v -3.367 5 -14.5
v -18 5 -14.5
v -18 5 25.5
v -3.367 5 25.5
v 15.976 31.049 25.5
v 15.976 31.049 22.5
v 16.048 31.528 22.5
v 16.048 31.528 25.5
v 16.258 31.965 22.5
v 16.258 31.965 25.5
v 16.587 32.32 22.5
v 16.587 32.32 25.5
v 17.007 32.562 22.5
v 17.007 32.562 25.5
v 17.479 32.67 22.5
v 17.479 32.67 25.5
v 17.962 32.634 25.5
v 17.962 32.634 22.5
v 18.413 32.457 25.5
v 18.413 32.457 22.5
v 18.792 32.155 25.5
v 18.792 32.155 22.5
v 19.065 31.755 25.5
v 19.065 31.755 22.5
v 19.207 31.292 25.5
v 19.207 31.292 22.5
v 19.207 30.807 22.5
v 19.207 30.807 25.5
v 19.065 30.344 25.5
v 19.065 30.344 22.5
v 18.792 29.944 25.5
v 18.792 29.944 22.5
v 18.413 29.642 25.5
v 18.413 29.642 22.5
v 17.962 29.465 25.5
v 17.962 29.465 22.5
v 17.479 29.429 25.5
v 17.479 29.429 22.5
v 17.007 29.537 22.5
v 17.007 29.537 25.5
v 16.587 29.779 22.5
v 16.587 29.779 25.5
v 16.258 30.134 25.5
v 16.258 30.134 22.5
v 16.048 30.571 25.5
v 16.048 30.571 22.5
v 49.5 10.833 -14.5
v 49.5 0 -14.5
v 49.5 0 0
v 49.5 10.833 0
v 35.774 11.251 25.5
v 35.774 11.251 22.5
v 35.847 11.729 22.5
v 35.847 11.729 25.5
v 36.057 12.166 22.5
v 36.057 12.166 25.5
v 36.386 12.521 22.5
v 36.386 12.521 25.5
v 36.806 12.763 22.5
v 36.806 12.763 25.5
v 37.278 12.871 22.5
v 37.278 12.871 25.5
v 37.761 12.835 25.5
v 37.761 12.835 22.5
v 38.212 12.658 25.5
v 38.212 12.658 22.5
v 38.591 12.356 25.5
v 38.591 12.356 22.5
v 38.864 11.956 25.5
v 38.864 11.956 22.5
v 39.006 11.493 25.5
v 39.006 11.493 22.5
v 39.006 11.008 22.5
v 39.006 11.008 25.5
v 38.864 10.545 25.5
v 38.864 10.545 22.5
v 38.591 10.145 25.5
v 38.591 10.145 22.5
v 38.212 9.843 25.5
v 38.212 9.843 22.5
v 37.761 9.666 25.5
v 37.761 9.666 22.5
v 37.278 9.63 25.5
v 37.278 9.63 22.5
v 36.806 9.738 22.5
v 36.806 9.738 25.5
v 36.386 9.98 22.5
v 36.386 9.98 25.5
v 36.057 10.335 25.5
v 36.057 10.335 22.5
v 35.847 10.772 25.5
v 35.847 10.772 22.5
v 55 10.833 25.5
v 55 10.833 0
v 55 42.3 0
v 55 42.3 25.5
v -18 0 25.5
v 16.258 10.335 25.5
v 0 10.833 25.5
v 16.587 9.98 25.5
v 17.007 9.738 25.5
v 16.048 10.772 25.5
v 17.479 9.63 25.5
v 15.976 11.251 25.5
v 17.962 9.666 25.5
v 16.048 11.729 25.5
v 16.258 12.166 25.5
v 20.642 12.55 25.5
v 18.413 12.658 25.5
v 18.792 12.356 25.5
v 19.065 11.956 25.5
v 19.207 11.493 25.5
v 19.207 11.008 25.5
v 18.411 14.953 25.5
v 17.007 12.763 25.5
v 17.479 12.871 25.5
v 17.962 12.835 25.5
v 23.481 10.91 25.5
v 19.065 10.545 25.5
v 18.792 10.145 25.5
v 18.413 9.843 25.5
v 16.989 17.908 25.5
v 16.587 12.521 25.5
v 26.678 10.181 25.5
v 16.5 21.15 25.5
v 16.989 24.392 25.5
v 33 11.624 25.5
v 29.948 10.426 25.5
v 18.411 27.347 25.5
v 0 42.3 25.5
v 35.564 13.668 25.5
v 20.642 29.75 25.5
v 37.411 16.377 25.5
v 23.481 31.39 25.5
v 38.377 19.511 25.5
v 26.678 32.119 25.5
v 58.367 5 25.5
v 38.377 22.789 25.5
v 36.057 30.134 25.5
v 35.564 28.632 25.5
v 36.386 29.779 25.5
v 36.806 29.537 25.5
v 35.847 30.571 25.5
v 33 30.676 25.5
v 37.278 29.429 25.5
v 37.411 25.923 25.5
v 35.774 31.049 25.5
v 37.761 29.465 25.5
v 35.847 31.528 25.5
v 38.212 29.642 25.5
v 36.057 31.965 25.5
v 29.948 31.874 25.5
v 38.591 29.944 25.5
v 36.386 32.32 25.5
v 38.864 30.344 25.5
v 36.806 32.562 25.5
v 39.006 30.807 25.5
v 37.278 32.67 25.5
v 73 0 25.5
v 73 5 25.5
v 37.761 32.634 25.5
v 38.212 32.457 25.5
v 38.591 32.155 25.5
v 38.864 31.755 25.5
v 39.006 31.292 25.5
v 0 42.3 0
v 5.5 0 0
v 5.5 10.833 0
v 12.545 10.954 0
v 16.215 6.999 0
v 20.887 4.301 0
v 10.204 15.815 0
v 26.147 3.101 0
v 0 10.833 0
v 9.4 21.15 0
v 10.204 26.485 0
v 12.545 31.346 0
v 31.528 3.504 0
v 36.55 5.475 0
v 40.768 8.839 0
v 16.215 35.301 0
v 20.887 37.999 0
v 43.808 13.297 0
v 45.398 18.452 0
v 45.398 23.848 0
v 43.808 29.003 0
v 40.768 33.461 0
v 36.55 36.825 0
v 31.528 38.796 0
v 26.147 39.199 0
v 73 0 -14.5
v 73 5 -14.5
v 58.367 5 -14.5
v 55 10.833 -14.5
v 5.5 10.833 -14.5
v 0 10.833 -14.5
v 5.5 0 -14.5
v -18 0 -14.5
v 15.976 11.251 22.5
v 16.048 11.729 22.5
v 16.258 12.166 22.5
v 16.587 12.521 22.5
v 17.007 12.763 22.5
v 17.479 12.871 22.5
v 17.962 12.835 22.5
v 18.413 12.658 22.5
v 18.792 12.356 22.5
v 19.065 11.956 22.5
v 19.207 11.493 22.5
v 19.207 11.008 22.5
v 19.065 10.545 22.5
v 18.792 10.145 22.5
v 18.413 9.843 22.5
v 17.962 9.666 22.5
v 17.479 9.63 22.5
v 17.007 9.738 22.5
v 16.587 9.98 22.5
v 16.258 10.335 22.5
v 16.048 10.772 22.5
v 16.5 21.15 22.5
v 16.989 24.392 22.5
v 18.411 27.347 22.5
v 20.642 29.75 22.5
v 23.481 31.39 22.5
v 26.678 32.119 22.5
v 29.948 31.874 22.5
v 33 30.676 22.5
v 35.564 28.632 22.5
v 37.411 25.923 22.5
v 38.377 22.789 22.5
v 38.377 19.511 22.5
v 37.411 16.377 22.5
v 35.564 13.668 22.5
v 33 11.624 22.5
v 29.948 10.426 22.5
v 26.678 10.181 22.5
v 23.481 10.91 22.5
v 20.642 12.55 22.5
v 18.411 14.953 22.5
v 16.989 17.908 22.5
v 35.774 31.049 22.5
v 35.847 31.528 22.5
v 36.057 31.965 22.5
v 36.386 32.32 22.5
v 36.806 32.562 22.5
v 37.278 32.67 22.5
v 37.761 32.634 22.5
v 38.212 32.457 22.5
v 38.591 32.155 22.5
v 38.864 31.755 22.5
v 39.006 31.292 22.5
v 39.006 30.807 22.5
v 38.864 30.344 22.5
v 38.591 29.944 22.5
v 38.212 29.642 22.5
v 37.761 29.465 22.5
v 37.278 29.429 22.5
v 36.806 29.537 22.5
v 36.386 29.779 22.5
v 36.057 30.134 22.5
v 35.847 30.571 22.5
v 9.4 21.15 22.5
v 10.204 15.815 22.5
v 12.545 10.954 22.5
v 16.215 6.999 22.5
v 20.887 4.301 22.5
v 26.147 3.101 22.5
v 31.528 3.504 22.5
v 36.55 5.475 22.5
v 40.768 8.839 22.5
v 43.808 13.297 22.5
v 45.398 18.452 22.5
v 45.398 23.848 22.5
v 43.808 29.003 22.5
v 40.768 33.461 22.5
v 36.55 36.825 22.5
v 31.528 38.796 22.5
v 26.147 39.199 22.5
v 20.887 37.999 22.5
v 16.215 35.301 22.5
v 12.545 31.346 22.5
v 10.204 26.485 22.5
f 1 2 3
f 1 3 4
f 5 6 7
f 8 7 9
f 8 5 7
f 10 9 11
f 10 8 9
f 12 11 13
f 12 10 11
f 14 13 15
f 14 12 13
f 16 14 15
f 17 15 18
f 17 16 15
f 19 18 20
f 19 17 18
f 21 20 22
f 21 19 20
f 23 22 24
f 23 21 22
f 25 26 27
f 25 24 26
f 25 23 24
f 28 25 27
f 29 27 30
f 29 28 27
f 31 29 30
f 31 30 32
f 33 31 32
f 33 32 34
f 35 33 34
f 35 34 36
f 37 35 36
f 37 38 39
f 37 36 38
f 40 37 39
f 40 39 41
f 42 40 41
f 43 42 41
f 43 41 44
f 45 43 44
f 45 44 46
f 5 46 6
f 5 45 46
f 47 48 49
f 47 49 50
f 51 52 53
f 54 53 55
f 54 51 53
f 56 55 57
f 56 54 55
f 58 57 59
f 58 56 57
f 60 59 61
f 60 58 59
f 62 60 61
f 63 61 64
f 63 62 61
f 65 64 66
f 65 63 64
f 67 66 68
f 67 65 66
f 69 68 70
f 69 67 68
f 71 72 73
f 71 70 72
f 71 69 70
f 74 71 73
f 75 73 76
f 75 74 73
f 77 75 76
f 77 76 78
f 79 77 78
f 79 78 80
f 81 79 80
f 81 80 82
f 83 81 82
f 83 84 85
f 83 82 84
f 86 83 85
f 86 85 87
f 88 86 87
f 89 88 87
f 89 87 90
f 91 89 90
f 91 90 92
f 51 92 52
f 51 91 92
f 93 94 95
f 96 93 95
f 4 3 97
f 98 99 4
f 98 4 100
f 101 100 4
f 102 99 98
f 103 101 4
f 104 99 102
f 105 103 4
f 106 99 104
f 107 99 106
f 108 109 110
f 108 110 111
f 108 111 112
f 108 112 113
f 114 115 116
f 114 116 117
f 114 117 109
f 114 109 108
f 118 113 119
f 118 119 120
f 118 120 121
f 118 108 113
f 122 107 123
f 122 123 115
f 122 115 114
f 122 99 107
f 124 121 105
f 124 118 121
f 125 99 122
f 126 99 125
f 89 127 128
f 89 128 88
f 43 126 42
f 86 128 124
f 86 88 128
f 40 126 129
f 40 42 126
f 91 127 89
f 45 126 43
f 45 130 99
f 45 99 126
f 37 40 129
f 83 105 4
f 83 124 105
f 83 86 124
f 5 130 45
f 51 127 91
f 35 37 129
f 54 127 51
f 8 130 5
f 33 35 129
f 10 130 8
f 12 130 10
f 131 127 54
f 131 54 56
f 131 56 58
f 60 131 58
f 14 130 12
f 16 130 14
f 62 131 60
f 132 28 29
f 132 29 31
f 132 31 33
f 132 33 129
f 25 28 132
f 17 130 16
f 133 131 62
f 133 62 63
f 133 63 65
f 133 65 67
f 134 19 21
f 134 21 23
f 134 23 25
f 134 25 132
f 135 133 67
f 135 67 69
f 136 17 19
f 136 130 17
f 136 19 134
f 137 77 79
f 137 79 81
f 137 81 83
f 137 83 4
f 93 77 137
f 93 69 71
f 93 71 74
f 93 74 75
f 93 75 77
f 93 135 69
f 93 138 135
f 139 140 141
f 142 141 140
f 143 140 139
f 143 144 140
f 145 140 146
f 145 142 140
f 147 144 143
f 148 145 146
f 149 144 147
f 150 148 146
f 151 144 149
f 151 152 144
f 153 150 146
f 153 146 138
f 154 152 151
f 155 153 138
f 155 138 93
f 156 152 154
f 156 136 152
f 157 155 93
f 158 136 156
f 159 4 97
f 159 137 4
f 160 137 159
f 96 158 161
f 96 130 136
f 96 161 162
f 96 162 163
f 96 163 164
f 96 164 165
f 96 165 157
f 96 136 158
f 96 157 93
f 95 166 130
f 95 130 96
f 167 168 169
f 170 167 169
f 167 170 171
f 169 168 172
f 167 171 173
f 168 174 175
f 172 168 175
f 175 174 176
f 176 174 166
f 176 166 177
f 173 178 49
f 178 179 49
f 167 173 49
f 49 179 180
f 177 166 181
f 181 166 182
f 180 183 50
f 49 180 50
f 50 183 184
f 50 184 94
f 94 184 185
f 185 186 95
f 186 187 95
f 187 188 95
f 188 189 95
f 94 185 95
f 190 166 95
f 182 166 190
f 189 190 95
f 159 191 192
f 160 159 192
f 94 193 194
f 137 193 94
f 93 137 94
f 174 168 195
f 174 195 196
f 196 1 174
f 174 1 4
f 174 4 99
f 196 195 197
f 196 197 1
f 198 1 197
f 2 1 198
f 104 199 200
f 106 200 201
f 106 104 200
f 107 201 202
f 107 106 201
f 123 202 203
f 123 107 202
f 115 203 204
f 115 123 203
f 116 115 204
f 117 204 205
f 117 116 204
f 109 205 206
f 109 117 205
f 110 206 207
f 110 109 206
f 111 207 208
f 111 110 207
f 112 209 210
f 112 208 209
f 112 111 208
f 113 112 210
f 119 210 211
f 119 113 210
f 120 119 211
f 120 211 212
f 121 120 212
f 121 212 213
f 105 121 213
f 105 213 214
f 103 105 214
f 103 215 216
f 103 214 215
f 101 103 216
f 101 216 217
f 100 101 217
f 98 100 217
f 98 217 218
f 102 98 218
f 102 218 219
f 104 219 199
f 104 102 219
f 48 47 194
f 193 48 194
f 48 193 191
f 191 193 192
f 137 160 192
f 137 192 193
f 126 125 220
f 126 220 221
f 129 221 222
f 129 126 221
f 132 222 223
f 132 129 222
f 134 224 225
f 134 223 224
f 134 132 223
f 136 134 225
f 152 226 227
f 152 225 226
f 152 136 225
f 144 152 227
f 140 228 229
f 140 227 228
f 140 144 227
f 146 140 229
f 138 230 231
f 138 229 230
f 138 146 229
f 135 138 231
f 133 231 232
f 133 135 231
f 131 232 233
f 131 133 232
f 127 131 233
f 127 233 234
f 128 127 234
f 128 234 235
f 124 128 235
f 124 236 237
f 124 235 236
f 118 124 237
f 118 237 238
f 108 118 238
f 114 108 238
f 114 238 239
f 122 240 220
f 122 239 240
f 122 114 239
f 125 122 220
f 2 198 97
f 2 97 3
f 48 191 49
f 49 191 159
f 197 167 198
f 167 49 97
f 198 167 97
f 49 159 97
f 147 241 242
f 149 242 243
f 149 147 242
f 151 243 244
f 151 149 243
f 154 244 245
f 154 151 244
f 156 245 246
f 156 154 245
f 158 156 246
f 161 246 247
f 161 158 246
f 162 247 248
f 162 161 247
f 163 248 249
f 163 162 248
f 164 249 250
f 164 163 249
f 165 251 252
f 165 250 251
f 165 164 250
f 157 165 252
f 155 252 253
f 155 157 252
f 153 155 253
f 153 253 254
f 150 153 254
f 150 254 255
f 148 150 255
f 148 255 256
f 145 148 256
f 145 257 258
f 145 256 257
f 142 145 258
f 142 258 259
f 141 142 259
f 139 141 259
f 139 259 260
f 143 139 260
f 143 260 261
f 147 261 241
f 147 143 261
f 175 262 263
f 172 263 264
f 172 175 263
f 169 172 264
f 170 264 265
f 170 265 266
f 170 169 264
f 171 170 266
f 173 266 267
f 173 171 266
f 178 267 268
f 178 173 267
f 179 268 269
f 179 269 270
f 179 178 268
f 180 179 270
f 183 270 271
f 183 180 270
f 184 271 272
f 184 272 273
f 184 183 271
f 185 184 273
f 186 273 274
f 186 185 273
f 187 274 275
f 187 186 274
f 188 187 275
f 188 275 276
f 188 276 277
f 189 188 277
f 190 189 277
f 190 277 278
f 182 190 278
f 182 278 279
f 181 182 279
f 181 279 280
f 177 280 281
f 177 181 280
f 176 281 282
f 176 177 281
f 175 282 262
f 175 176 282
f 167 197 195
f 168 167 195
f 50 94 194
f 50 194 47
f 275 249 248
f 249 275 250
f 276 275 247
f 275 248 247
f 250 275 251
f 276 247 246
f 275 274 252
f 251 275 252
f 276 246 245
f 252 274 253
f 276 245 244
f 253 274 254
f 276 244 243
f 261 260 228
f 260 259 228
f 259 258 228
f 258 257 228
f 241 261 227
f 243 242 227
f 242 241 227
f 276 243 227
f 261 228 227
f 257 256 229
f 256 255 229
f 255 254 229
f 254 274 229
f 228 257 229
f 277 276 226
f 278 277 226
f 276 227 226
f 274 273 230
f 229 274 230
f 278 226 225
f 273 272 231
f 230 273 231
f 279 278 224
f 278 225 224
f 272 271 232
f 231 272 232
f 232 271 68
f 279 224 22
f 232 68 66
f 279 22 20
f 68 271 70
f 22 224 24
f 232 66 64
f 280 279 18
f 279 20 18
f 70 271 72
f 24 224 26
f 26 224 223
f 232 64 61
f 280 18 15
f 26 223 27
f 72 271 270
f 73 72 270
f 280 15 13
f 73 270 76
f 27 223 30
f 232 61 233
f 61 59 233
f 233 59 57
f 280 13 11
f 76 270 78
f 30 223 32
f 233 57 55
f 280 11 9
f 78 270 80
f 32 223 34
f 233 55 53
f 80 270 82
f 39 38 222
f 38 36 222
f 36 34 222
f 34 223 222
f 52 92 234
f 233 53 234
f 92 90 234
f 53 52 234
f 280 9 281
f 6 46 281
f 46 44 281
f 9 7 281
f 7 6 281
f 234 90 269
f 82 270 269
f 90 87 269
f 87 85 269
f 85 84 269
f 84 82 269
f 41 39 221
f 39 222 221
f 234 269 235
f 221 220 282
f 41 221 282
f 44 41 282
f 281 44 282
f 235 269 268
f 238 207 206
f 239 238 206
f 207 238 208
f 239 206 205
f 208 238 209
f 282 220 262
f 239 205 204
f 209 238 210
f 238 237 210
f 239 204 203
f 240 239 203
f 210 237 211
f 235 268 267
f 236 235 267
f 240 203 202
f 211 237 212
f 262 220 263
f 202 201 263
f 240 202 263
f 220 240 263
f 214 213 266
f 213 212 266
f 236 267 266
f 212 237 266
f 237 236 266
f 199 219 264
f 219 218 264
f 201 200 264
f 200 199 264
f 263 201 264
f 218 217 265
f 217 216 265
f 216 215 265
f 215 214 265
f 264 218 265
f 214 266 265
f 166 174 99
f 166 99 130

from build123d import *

# Parameters (mm, degrees)
ESQUISSE1_W                  = 55
ESQUISSE1_H                  = 42.3
BOSS_EXTRU_1_DEPTH           = 25.5
ESQUISSE4_R                  = 18.1
ENL_V_MAT_EXTRU_3_DEPTH      = 22.5
ENL_V_MAT_EXTRU_4_DEPTH      = 62.713369702
ENL_V_MAT_EXTRU_4_DEPTH_BACK = 62.713369702
ESQUISSE5_R                  = 11
ESQUISSE6_R                  = 1.625
ENL_V_MAT_EXTRU_5_DEPTH      = 10
BOSS_EXTRU_2_DEPTH           = 40
ESQUISSE16_W                 = 5.5
ESQUISSE16_H                 = 10.832527472
BOSS_EXTRU_4_DEPTH           = 14.5


with BuildPart() as part:
    # Esquisse1 → Boss.-Extru.1 (new body)
    with BuildSketch(Plane.XY):
        with Locations((27.5, 21.15)):
            Rectangle(ESQUISSE1_W, ESQUISSE1_H)
    extrude(amount=BOSS_EXTRU_1_DEPTH)

    # Esquisse4 → Enlèv. mat.-Extru.3 (cut)
    with BuildSketch(Plane.XY):
        with Locations(Location((27.5, 21.15, 0), (0, 0, 180))):
            Circle(ESQUISSE4_R)
    extrude(amount=ENL_V_MAT_EXTRU_3_DEPTH, mode=Mode.SUBTRACT)

    # Esquisse5 → Enlèv. mat.-Extru.4 (cut, two sides: drawn at the far end of the back side and taken through both)
    with BuildSketch(Plane(origin=(37, 0, 25.5), x_dir=(-1, 0, 0), z_dir=(0, 0, -1)).offset(-ENL_V_MAT_EXTRU_4_DEPTH_BACK)):
        with Locations((9.5, 21.15)):
            Circle(ESQUISSE5_R)
    extrude(amount=ENL_V_MAT_EXTRU_4_DEPTH + ENL_V_MAT_EXTRU_4_DEPTH_BACK, mode=Mode.SUBTRACT)

    # Esquisse6 → Enlèv. mat.-Extru.5 (cut)
    with BuildSketch(Plane(origin=(0, 0, 25.5), x_dir=(-1, 0, 0), z_dir=(0, 0, -1))):
        with Locations((-37.399494937, 31.049494937)):
            Circle(ESQUISSE6_R)
        with Locations((-17.600505063, 31.049494937)):
            Circle(ESQUISSE6_R)
        with Locations((-17.600505063, 11.250505063)):
            Circle(ESQUISSE6_R)
        with Locations((-37.399494937, 11.250505063)):
            Circle(ESQUISSE6_R)
    extrude(amount=ENL_V_MAT_EXTRU_5_DEPTH, mode=Mode.SUBTRACT)

    # Esquisse7 → Boss.-Extru.2 (add)
    with BuildSketch(Plane.XY.offset(25.5)):
        Polygon((55, 0), (73, 0), (73, 5), (58.367411306, 5), (55, 10.832527472), align=None)
        Polygon((-18, 0), (-18, 5), (-3.367411306, 5), (0, 10.832527472), (0, 0), align=None)
    extrude(amount=-BOSS_EXTRU_2_DEPTH)

    # Esquisse16 → Boss.-Extru.4 (add)
    with BuildSketch(Plane(origin=(0, 0, 0), x_dir=(-1, 0, 0), z_dir=(0, 0, -1))):
        with Locations((-2.75, 5.416263736)):
            Rectangle(ESQUISSE16_W, ESQUISSE16_H)
        with Locations((-52.25, 5.416263736)):
            Rectangle(ESQUISSE16_W, ESQUISSE16_H)
    extrude(amount=BOSS_EXTRU_4_DEPTH)


solid = part.part
